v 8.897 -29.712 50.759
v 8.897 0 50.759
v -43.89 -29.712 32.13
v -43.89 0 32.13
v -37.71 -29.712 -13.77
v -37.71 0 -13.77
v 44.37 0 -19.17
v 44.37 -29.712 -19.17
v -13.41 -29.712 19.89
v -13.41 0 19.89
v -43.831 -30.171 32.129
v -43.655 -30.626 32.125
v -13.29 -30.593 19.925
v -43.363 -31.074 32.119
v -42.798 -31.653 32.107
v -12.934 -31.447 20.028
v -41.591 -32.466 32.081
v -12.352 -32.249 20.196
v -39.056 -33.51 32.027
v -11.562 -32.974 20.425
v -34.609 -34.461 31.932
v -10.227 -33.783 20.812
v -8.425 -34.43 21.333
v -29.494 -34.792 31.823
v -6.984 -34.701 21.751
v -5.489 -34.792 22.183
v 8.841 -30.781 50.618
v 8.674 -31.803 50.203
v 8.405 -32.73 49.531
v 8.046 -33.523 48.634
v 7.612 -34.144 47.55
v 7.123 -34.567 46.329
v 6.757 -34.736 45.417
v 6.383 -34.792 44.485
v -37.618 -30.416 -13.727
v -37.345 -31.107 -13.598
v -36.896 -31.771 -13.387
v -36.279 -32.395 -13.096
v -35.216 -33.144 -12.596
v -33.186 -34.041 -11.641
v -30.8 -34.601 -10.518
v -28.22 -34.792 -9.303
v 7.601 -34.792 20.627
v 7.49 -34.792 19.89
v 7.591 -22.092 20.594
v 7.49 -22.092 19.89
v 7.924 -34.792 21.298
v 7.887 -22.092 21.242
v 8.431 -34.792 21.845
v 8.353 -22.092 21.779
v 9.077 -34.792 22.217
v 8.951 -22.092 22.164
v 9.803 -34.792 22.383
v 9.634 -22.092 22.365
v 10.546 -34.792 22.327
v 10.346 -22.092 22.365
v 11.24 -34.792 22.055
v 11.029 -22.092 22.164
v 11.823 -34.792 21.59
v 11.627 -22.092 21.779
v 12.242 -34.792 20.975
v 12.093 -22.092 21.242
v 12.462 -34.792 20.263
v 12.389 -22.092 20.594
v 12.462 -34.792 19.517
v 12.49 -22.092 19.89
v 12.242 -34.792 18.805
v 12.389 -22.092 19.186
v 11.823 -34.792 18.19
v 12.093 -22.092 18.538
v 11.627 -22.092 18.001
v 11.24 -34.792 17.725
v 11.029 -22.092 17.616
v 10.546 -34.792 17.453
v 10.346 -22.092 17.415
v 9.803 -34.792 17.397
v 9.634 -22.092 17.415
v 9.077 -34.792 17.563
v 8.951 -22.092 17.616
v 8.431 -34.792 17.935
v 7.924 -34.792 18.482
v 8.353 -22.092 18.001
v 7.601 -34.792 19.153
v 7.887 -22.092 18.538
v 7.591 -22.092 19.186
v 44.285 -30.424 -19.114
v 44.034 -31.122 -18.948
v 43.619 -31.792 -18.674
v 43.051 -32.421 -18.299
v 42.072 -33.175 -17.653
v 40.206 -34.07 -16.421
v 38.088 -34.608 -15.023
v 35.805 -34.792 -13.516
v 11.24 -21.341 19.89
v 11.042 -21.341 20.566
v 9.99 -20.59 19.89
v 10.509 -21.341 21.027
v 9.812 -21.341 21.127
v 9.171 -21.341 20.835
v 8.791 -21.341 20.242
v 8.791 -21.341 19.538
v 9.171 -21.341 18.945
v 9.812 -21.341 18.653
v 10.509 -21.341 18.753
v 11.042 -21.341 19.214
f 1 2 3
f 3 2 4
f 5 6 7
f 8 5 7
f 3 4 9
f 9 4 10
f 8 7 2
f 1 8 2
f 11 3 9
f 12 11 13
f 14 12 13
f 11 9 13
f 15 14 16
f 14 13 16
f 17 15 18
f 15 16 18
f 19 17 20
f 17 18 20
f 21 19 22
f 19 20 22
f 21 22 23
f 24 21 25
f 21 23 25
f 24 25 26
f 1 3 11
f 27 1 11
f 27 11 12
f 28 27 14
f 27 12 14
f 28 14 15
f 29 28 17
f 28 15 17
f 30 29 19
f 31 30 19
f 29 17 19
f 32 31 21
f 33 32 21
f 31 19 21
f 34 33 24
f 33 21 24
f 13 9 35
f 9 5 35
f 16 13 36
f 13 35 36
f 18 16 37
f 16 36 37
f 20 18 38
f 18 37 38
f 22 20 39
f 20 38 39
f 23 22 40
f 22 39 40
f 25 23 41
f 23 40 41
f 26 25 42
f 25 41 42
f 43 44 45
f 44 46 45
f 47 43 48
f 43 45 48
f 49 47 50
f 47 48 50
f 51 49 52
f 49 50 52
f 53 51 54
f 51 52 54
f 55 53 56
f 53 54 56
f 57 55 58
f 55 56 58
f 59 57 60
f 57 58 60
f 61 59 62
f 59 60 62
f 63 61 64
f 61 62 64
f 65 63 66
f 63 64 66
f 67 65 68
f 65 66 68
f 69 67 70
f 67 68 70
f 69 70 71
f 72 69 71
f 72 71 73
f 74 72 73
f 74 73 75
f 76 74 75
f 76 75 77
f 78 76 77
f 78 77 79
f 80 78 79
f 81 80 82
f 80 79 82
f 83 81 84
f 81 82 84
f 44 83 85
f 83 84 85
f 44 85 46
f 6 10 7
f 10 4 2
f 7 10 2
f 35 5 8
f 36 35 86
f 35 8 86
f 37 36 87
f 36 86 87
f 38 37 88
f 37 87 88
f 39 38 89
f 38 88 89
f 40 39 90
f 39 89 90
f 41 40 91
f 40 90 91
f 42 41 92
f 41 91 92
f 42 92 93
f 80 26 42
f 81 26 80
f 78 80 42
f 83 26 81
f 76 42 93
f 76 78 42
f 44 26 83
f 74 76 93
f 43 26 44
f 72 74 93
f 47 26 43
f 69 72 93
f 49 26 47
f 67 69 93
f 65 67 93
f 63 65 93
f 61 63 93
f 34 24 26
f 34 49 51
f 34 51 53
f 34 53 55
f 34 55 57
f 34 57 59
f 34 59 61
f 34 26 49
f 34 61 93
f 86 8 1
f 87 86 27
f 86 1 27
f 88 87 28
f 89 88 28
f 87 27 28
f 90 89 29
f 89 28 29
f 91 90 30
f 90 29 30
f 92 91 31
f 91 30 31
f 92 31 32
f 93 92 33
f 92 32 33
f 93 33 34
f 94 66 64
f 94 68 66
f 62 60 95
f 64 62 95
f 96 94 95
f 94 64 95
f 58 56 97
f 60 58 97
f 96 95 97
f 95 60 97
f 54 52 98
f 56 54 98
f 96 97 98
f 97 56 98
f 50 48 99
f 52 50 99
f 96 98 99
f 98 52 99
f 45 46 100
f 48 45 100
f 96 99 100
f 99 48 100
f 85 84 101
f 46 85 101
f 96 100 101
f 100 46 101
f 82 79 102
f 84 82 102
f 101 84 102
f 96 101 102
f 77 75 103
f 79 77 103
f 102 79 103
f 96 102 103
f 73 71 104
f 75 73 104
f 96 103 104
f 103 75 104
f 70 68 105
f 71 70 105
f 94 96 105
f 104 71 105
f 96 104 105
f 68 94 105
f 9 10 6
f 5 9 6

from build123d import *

# Parameters (mm, degrees)
F1_DEPTH = 34.79205
F2_R     = 5.08
F4_D     = 5
F4_DEPTH = 12.7
F4_TIP   = 1.5021515476


with BuildPart() as f1:
    # F0 (on Front) → F1 (new body)
    with BuildSketch(Plane.XZ):
        Polygon((8.8970496238, 50.7587020687), (-43.8900001305, 32.1299992502), (-13.4100001305, 19.8900010437), (-37.7099998295, -13.7700010091), (44.3699993193, -19.1700011492), align=None)
    extrude(amount=F1_DEPTH)

    # F2
    f2_edges = [f1.edges().sort_by_distance(p)[0] for p in [
        (-17.496475, -34.79205, 41.444351),
        (26.633524, -34.79205, 15.79435),
        (3.33, -34.79205, -16.470001),
        (-25.56, -34.79205, 3.06),
        (-28.65, -34.79205, 26.01),
    ]]
    fillet(f2_edges, radius=F2_R)

    # F4
    with Locations(Plane.XZ.offset(34.79205)):
        with Locations((9.9899992347, 19.8900010437)):
            Hole(F4_D / 2, depth=F4_DEPTH)
            with Locations((0, 0, -(F4_DEPTH + F4_TIP / 2))):  # 118° drill point
                Cone(0, F4_D / 2, F4_TIP, mode=Mode.SUBTRACT)


solid = f1.part
